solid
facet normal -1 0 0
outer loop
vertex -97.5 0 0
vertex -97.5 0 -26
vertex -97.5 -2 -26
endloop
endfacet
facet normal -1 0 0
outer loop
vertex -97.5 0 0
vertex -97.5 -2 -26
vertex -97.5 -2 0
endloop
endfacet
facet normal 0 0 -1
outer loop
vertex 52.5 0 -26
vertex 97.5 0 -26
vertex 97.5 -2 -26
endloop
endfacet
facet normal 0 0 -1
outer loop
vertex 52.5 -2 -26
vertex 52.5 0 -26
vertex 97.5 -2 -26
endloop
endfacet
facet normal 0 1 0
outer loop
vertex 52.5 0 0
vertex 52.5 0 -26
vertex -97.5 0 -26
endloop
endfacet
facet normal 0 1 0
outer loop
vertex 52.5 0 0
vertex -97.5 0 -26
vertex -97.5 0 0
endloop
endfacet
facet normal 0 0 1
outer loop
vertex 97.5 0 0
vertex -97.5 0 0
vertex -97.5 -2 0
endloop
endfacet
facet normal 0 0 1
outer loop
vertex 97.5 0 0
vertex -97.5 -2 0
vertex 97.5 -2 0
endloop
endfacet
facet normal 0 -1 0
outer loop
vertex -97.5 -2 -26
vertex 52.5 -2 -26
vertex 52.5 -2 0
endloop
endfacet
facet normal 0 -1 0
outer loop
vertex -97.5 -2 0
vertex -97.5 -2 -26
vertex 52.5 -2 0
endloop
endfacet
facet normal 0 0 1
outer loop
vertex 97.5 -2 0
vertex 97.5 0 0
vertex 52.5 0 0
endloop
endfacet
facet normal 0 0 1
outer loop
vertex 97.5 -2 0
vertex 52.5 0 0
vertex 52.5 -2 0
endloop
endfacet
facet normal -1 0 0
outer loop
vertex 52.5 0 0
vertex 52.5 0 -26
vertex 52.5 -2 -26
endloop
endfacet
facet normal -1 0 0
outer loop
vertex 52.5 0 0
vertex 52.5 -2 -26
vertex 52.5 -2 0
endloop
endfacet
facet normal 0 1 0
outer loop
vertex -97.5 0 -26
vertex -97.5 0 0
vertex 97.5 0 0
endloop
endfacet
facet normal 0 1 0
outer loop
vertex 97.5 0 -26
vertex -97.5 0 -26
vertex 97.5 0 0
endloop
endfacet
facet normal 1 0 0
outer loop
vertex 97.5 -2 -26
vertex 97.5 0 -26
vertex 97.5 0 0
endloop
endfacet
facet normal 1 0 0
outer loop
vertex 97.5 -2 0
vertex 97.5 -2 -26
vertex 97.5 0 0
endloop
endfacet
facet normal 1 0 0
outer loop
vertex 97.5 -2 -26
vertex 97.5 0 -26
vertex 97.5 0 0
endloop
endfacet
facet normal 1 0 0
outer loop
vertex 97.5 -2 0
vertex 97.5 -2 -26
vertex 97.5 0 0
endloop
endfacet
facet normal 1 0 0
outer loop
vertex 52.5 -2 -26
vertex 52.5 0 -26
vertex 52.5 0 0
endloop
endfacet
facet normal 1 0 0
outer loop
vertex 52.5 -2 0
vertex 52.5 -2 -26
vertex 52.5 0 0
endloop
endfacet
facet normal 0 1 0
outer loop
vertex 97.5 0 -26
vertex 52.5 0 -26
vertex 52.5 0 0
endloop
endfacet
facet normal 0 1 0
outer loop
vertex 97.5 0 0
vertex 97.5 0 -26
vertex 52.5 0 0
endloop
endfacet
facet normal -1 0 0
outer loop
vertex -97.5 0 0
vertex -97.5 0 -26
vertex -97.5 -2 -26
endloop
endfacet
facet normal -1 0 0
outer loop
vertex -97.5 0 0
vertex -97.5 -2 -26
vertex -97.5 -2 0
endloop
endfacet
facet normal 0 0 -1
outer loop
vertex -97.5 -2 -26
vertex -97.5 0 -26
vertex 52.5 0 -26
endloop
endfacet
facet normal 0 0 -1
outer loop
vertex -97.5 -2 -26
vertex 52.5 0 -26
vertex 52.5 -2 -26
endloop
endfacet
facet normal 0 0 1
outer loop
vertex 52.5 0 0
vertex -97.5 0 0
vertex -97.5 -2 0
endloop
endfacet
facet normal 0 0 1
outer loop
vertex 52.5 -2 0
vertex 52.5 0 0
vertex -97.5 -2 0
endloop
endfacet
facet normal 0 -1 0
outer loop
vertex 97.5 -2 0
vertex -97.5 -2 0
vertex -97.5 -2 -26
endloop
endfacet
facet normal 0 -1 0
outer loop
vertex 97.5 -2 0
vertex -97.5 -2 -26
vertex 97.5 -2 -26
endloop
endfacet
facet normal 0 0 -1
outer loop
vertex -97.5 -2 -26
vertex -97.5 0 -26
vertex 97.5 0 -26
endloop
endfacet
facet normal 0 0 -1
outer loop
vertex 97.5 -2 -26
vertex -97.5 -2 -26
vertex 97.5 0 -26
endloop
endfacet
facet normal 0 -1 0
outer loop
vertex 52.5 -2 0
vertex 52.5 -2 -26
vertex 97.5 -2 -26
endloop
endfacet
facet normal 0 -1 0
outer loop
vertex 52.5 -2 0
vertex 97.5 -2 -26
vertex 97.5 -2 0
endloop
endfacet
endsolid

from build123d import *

# Parameters (mm, degrees)
F0_W     = 195
F0_H     = 26
F1_DEPTH = 2
F2_DEPTH = 150
F3_DEPTH = 45


with BuildPart() as f1:
    # F0 (on Front) → F1 (new body)
    with BuildSketch(Plane.XZ):
        with Locations((0, -13)):
            Rectangle(F0_W, F0_H)
    extrude(amount=F1_DEPTH)


with BuildPart() as f2:
    # F2 (new): a face of the model
    f2_faces = [f1.part.faces().sort_by_distance(p)[0] for p in [
        (-97.5, -1, -13),
    ]]
    extrude(f2_faces, amount=-F2_DEPTH)


with BuildPart() as f3:
    # F3 (new, through all): a face of the model
    f3_faces = [f1.part.faces().sort_by_distance(p)[0] for p in [
        (97.5, -1, -13),
    ]]
    extrude(f3_faces, amount=-F3_DEPTH)


solid = Compound([f1.part, f2.part, f3.part])
